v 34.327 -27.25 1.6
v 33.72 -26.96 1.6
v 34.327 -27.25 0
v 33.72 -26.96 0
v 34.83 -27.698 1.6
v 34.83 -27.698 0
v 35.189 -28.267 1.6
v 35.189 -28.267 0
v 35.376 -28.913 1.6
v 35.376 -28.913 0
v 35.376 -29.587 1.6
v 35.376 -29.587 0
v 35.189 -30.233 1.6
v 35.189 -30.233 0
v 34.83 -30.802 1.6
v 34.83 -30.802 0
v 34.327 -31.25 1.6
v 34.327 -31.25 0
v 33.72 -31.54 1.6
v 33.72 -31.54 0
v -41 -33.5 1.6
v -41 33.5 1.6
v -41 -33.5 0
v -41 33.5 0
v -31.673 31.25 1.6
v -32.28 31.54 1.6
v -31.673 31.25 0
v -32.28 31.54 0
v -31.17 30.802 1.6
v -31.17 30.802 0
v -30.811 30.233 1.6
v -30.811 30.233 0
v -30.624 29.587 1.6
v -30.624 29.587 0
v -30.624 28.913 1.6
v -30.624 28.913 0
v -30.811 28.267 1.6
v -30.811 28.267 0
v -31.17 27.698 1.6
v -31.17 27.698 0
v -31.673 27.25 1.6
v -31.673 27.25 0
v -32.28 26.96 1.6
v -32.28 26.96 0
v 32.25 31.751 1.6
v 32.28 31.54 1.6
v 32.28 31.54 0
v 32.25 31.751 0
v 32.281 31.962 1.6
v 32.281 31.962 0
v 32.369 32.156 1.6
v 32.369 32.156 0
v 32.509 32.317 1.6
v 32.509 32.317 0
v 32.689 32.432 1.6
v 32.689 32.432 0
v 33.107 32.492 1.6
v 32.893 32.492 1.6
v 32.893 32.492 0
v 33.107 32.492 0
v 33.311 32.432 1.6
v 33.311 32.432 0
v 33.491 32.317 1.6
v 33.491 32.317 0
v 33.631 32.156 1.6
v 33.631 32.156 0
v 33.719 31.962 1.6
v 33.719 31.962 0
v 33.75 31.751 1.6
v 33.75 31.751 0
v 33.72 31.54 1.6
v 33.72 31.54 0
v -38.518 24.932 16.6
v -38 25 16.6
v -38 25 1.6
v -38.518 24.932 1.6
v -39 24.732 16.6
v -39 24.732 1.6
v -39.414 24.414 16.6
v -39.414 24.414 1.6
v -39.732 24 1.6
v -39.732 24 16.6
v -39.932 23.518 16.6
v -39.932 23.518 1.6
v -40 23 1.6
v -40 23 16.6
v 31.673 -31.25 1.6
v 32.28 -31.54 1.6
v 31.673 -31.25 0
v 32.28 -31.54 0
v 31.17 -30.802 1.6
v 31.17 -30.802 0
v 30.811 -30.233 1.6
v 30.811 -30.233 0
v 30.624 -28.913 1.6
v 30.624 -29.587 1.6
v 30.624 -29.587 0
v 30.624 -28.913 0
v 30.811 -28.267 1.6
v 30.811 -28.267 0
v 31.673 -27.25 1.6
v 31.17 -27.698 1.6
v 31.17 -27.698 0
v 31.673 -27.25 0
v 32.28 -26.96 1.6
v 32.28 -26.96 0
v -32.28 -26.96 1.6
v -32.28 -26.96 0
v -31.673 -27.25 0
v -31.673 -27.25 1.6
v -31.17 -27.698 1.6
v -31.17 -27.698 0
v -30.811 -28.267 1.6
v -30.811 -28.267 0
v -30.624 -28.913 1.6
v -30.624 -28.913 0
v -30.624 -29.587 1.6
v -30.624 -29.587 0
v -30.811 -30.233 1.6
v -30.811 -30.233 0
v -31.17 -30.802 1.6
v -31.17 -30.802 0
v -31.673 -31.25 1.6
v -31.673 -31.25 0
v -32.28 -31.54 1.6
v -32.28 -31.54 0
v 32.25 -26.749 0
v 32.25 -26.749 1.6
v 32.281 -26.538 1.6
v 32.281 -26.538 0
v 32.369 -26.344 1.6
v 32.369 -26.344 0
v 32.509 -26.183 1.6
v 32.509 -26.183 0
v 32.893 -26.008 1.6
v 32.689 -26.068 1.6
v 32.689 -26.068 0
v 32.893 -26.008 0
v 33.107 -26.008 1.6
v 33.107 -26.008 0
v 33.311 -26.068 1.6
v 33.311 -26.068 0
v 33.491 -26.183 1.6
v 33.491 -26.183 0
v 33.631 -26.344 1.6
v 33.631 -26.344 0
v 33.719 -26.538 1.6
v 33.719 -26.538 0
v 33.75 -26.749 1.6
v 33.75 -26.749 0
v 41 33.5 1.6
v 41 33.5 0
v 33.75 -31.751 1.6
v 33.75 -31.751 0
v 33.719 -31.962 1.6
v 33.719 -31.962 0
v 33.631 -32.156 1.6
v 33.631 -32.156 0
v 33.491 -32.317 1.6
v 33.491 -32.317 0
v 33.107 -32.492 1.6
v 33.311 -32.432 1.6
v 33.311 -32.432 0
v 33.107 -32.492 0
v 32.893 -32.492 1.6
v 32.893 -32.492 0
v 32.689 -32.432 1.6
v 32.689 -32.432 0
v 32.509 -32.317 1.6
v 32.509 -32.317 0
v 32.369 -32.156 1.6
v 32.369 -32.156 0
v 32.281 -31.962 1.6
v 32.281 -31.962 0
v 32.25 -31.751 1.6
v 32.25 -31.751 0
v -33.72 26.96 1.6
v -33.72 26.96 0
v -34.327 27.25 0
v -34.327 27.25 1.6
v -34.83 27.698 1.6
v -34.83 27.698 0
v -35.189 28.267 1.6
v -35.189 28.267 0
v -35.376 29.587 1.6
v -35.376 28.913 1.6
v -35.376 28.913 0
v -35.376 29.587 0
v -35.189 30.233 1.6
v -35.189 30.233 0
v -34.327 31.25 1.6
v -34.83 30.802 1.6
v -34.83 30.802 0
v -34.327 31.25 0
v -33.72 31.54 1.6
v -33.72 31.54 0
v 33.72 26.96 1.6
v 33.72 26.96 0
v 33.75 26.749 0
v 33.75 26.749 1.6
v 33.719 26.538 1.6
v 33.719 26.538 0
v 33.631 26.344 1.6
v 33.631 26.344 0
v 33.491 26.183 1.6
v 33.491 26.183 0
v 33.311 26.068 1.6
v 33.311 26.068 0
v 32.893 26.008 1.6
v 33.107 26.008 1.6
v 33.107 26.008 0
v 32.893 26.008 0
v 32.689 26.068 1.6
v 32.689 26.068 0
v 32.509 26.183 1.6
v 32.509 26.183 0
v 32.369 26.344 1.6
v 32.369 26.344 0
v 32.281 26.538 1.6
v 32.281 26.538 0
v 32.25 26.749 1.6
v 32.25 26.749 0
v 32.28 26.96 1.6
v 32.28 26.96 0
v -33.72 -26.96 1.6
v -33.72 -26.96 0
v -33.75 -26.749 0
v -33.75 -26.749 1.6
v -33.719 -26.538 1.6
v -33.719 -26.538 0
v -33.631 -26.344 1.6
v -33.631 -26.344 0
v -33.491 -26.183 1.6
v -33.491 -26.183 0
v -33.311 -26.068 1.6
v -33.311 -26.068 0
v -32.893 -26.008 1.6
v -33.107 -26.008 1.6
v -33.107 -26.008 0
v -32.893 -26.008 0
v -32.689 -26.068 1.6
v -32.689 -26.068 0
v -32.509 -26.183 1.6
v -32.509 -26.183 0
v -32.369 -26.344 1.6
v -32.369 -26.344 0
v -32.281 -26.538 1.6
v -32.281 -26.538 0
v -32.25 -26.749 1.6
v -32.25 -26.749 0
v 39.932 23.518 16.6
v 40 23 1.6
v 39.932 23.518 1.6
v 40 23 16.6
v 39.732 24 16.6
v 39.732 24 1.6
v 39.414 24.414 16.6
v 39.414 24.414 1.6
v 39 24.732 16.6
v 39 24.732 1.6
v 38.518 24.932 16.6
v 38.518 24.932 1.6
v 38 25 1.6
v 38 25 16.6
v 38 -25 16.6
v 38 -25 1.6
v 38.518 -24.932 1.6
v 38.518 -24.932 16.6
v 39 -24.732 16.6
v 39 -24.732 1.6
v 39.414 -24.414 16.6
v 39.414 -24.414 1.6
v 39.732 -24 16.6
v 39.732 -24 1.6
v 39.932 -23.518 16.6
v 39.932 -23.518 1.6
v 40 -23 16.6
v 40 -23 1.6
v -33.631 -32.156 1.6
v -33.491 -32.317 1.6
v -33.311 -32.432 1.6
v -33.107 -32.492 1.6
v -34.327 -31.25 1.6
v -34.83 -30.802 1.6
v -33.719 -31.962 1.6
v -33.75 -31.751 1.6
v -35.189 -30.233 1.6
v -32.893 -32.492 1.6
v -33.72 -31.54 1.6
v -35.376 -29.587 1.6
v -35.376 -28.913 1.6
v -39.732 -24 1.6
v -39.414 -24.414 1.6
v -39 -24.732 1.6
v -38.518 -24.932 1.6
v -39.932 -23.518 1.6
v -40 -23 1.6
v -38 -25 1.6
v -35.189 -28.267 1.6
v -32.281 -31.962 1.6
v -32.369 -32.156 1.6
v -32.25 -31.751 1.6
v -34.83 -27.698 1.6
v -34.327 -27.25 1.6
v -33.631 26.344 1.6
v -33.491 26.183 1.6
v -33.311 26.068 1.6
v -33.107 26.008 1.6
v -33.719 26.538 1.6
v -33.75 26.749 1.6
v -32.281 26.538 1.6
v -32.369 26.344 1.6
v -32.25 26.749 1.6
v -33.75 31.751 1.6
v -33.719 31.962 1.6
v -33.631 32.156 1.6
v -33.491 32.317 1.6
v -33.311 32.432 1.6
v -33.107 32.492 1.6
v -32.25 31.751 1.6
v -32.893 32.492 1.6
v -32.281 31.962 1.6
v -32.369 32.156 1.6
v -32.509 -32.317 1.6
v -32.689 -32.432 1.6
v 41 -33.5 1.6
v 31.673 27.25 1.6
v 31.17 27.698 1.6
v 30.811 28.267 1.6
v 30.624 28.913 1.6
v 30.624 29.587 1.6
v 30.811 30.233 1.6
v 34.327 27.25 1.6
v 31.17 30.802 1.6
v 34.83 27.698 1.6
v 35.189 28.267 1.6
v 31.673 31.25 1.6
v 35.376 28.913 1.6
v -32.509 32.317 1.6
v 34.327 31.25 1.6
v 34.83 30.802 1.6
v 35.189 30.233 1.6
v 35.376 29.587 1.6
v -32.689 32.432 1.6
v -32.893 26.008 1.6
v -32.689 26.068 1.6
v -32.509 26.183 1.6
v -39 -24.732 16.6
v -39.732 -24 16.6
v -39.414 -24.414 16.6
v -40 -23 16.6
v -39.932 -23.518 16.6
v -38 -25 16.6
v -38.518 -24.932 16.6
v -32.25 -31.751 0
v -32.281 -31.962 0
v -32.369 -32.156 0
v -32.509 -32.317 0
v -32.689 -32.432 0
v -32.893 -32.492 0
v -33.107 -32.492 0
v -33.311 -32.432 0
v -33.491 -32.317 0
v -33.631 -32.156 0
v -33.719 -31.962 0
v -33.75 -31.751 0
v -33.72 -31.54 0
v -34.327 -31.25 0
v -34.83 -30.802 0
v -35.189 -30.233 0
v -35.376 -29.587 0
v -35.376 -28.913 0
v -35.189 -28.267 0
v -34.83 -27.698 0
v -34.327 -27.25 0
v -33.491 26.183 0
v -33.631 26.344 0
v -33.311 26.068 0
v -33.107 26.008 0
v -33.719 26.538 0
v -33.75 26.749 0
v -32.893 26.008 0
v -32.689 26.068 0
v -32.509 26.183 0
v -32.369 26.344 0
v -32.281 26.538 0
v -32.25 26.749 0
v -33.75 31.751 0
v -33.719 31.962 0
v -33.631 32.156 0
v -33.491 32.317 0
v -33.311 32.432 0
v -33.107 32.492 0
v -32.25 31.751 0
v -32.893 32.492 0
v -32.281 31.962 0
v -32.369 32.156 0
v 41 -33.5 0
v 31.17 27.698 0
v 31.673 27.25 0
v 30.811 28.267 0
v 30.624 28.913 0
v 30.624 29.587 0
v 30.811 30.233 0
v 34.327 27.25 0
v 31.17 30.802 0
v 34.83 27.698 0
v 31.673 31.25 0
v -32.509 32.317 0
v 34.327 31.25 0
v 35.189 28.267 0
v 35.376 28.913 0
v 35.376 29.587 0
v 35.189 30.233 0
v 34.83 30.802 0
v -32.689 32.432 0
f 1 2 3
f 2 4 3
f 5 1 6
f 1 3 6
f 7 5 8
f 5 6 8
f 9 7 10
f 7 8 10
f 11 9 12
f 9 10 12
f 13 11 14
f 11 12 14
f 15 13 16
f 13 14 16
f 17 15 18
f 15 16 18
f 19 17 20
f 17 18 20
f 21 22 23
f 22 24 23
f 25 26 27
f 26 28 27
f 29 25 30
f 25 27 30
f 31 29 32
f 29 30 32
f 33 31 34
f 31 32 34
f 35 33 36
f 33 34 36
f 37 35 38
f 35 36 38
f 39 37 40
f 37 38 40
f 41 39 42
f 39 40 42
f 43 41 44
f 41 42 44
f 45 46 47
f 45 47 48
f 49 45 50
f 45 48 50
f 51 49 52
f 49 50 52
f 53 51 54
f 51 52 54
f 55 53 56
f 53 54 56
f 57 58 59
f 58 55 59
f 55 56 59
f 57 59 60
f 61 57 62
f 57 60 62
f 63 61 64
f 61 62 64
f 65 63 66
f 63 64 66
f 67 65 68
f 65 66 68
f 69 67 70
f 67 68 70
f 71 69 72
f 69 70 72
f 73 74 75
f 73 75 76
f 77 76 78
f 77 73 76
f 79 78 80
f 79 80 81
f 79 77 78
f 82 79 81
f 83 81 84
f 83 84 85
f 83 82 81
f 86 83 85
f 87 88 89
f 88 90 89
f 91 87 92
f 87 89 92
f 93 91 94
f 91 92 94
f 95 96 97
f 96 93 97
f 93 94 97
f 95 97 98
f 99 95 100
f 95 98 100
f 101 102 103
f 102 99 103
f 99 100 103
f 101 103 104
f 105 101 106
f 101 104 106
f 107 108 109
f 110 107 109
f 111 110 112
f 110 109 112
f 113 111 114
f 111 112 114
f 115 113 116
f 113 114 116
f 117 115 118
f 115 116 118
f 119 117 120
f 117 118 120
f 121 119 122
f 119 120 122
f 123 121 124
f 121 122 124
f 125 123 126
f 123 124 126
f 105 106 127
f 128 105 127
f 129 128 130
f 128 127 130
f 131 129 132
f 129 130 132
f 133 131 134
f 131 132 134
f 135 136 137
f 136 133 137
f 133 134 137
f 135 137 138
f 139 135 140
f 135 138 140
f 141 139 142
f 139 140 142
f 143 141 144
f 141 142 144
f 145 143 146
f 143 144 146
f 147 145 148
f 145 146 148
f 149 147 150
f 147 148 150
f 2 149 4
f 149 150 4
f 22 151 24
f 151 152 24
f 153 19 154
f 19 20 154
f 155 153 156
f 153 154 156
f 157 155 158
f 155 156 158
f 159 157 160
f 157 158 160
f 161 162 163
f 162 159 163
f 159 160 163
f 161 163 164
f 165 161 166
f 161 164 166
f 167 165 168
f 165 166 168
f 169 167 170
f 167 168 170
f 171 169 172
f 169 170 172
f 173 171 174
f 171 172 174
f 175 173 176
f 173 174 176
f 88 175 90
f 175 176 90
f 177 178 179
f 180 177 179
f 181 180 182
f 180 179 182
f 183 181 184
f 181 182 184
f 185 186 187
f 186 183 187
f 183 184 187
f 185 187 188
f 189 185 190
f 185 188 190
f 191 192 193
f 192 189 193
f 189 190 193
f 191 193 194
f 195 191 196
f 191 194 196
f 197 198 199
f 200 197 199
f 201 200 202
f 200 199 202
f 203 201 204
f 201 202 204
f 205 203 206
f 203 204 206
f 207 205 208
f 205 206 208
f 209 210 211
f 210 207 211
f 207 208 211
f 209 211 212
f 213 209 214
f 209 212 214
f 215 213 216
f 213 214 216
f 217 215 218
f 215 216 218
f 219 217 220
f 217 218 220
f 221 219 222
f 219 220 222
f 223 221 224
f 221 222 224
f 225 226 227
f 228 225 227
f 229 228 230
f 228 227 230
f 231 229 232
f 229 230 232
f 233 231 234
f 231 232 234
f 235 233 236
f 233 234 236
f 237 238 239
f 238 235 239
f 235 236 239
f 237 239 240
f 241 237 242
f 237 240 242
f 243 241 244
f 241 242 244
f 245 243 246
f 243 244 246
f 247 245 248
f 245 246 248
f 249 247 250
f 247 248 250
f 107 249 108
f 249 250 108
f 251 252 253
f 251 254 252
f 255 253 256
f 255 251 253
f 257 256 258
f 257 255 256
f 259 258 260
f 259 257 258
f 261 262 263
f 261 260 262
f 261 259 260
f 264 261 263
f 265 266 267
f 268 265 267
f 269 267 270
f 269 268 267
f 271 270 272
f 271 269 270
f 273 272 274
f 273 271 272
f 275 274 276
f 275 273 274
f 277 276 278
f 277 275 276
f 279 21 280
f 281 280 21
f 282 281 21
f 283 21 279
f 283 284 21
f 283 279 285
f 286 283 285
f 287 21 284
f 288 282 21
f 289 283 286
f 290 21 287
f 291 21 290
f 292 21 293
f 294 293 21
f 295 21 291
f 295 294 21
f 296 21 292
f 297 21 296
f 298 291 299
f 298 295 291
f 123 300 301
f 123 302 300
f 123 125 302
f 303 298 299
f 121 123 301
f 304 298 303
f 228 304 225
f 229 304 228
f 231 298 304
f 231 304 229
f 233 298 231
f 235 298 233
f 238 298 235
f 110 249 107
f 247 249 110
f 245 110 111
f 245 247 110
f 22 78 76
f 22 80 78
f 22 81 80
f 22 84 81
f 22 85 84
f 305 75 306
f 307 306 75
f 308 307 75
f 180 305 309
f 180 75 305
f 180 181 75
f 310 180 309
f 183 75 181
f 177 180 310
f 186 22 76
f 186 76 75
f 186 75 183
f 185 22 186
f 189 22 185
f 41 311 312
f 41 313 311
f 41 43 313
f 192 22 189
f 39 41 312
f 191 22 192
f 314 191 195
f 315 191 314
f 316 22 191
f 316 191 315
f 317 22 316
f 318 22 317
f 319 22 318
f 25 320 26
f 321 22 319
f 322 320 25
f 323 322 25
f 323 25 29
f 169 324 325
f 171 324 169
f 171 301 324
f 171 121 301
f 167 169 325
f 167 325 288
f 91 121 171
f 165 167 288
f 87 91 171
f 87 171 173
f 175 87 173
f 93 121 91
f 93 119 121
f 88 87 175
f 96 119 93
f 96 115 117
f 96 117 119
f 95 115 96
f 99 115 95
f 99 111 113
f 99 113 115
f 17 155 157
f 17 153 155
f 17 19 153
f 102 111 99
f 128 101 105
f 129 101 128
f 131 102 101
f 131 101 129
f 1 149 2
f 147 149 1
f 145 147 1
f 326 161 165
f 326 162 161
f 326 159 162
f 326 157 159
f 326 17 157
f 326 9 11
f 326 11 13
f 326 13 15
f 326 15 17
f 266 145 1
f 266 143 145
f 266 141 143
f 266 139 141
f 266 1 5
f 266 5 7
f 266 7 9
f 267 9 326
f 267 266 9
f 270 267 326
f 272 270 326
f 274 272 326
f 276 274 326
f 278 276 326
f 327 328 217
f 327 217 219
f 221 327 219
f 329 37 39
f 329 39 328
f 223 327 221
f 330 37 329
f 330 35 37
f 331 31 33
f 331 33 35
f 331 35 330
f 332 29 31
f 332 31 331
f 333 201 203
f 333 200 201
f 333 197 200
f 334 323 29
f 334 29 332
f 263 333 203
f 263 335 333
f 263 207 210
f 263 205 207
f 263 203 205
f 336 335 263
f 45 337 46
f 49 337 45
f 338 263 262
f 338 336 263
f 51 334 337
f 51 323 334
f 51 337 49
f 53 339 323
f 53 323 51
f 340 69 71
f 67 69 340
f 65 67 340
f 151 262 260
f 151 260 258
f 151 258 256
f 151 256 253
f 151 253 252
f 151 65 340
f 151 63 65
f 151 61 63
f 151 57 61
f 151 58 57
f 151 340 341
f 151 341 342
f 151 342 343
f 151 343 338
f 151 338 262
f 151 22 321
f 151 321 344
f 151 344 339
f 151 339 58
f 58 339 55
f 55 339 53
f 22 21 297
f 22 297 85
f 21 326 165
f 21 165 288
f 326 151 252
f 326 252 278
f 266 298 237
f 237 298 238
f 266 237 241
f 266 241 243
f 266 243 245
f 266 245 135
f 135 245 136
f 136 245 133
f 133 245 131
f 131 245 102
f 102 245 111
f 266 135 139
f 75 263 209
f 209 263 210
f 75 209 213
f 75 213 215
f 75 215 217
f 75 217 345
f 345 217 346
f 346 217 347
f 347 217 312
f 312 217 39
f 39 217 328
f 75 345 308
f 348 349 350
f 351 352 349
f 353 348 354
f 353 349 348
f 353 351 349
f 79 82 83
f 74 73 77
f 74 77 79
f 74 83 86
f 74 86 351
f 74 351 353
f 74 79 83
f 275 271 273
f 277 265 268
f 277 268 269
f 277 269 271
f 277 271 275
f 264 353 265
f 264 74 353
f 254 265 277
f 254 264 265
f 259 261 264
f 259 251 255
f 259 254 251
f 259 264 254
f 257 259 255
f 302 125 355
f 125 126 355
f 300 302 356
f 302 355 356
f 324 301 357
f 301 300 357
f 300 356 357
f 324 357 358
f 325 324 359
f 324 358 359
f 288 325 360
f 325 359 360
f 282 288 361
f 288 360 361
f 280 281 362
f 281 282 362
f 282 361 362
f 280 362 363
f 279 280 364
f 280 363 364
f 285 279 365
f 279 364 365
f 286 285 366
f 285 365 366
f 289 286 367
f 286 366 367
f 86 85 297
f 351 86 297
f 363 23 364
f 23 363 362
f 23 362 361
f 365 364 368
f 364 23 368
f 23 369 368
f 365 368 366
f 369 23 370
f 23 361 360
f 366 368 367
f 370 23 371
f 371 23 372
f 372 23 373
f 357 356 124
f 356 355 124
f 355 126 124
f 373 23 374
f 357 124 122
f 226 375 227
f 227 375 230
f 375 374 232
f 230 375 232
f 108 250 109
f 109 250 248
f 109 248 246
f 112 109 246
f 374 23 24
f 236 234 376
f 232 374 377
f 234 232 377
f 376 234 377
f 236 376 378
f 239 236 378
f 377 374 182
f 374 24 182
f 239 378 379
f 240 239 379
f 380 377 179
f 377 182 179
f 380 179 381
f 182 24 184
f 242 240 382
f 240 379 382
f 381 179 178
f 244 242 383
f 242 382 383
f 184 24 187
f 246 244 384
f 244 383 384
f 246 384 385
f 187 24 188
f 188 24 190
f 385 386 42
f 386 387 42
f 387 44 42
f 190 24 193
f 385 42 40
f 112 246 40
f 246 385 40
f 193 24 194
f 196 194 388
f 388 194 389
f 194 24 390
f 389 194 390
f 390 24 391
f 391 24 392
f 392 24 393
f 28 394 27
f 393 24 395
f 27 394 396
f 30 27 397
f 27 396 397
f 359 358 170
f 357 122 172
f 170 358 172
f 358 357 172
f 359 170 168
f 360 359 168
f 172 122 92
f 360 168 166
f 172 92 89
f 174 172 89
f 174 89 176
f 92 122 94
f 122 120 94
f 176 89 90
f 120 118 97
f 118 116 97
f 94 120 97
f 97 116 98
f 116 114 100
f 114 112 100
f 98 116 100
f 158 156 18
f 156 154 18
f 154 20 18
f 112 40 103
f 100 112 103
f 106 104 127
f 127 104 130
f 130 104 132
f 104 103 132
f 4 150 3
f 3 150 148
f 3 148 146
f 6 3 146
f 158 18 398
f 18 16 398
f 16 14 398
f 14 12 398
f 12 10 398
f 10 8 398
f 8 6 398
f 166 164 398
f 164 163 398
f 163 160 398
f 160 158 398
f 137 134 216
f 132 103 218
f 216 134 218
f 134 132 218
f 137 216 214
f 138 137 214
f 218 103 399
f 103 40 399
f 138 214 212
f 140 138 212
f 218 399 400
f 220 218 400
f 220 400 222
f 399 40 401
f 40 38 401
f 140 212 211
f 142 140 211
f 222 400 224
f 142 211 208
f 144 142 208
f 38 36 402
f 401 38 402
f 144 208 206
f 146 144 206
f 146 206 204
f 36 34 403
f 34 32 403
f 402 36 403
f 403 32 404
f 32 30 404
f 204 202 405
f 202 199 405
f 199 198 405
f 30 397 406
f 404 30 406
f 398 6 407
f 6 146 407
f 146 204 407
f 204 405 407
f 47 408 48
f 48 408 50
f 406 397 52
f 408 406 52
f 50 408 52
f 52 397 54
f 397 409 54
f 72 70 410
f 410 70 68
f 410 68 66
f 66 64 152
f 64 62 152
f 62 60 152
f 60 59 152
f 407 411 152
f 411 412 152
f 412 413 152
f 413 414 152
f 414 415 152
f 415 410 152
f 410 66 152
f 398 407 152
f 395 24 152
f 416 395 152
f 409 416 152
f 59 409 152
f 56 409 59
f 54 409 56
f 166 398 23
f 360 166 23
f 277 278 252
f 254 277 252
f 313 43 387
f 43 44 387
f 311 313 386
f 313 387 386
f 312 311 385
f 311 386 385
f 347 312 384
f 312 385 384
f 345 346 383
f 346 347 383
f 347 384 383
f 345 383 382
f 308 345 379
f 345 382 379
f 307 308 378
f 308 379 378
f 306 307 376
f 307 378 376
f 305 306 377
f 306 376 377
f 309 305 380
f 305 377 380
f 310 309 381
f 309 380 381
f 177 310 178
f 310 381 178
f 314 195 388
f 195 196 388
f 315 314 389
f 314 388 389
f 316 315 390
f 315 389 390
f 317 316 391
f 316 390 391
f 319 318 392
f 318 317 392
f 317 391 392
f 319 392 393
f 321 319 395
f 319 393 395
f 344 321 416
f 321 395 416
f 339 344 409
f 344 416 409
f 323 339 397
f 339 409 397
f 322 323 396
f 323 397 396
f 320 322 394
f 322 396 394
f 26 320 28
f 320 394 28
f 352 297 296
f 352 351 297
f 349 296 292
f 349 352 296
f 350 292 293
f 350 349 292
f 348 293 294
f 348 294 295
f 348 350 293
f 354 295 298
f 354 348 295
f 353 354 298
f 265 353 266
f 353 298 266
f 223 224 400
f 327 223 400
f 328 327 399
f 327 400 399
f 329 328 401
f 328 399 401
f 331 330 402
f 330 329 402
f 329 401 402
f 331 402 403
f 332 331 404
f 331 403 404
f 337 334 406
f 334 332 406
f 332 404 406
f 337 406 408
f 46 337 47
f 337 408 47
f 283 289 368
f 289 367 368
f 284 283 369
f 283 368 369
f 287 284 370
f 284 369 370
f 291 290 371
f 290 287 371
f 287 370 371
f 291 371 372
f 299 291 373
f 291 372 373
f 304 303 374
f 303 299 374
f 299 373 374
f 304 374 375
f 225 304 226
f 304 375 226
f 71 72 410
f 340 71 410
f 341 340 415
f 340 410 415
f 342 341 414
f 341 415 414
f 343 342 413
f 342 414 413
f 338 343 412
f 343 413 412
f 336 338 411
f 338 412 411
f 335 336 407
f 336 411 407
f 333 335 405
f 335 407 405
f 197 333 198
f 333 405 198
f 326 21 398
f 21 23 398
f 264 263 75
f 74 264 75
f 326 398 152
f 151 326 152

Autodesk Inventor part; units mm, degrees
ref_plane "YZ Plane" through (0, 0, 0) normal (1, 0, 0) x (0, 1, 0)
ref_plane "XZ Plane" through (0, 0, 0) normal (0, 1, 0) x (-1, 0, 0)
ref_plane "XY Plane" through (0, 0, 0) normal (0, 0, 1) x (1, 0, 0)
sketch "Sketch1" plane through (0, 0, 0) normal (0, 0, 1) x (1, 0, 0)
  line L0 (41, 33.5) -> (-41, 33.5)
  line L1 (-41, 33.5) -> (-41, -33.5)
  line L2 (-41, -33.5) -> (41, -33.5)
  line L3 (41, -33.5) -> (41, 33.5)
  line L4 (41, 33.5) -> (-41, -33.5) construction
  line L5 (-41, 33.5) -> (41, -33.5) construction
  line L6 (-33, 29.25) -> (33, 29.25) construction
  line L7 (33, 29.25) -> (33, -29.25) construction
  line L8 (33, -29.25) -> (-33, -29.25) construction
  line L9 (-33, -29.25) -> (-33, 29.25) construction
  line L10 (-33, 29.25) -> (33, -29.25) construction
  line L11 (33, 29.25) -> (-33, -29.25) construction
  line L12 (41, 0) -> (-41, 0) construction
  line L13 (0, 33.5) -> (0, -33.5) construction
  circle A0 centre (33, 29.25) radius 2.4
  circle A1 centre (-33, 29.25) radius 2.4
  circle A2 centre (33, -29.25) radius 2.4
  circle A3 centre (-33, -29.25) radius 2.4
  line L14 (33, 32.5) -> (33, 26) construction
  arc A4 (32.2801, 26.9605) -> (33.7199, 26.9605) centre (33, 26.75) ccw
  arc A5 (-33.7199, 26.9605) -> (-32.2801, 26.9605) centre (-33, 26.75) ccw
  arc A6 (33.7199, -26.9605) -> (32.2801, -26.9605) centre (33, -26.75) ccw
  arc A7 (-32.2801, -26.9605) -> (-33.7199, -26.9605) centre (-33, -26.75) ccw
  line L15 (40, 25) -> (-40, 25)
  line L16 (-40, 25) -> (-40, -25)
  line L17 (-40, -25) -> (40, -25)
  line L18 (40, -25) -> (40, 25)
  line L19 (40, 25) -> (-40, -25) construction
  line L20 (-40, 25) -> (40, -25) construction
  arc A8 (33.7199, 31.5395) -> (32.2801, 31.5395) centre (33, 31.75) ccw
  arc A9 (-32.2801, 31.5395) -> (-33.7199, 31.5395) centre (-33, 31.75) ccw
  arc A10 (32.2801, -31.5395) -> (33.7199, -31.5395) centre (33, -31.75) ccw
  arc A11 (-33.7199, -31.5395) -> (-32.2801, -31.5395) centre (-33, -31.75) ccw
  point P0 (0, 0)
  point P1 (33, -26)
  point P2 (-32.2801, 26.9605)
  point P3 (-33.7199, 26.9605)
  point P4 (-33.7199, -26.9605)
  point P5 (-32.2801, -26.9605)
  point P6 (32.2801, -26.9605)
  point P7 (33.7199, -26.9605)
  point P8 (33, 32.5)
  point P9 (32.2801, 31.5395)
  point P10 (33.7199, 31.5395)
  point P11 (-33.7199, 31.5395)
  point P12 (-32.2801, 31.5395)
  point P13 (-32.2801, -31.5395)
  point P14 (-33.7199, -31.5395)
  point P15 (33.7199, -31.5395)
  point P16 (32.2801, -31.5395)
  dimension "d0" = 82
  dimension "d1" = 67
  dimension "d19" = 4.8
  dimension "d30" = 6.5
  dimension "d33" = 58.5
  dimension "d34" = 66
  dimension "d36" = 1.5
  dimension "d37" = 8.5
  dimension "d38" = 1
  dimension "d41" = 16
  dimension "d42" = 6.5
  dimension "d43" = 1
extrude "Extrusion1" add sketch "Sketch1" along normal blind 1.6 contours L3 L2 L1 L0 | L18 L17 L16 L15
extrude "Extrusion2" add sketch "Sketch1" along normal blind 16.6 contours L18 L17 L16 L15
fillet "Fillet1" radius 2 4 edges at (40, -25, 9.1) (40, 25, 9.1) (-40, -25, 9.1) (-40, 25, 9.1)
properties part number "SUSTAINA-ACTUATOR-POWER-BOARD" material "Acetal Resin, Black"
